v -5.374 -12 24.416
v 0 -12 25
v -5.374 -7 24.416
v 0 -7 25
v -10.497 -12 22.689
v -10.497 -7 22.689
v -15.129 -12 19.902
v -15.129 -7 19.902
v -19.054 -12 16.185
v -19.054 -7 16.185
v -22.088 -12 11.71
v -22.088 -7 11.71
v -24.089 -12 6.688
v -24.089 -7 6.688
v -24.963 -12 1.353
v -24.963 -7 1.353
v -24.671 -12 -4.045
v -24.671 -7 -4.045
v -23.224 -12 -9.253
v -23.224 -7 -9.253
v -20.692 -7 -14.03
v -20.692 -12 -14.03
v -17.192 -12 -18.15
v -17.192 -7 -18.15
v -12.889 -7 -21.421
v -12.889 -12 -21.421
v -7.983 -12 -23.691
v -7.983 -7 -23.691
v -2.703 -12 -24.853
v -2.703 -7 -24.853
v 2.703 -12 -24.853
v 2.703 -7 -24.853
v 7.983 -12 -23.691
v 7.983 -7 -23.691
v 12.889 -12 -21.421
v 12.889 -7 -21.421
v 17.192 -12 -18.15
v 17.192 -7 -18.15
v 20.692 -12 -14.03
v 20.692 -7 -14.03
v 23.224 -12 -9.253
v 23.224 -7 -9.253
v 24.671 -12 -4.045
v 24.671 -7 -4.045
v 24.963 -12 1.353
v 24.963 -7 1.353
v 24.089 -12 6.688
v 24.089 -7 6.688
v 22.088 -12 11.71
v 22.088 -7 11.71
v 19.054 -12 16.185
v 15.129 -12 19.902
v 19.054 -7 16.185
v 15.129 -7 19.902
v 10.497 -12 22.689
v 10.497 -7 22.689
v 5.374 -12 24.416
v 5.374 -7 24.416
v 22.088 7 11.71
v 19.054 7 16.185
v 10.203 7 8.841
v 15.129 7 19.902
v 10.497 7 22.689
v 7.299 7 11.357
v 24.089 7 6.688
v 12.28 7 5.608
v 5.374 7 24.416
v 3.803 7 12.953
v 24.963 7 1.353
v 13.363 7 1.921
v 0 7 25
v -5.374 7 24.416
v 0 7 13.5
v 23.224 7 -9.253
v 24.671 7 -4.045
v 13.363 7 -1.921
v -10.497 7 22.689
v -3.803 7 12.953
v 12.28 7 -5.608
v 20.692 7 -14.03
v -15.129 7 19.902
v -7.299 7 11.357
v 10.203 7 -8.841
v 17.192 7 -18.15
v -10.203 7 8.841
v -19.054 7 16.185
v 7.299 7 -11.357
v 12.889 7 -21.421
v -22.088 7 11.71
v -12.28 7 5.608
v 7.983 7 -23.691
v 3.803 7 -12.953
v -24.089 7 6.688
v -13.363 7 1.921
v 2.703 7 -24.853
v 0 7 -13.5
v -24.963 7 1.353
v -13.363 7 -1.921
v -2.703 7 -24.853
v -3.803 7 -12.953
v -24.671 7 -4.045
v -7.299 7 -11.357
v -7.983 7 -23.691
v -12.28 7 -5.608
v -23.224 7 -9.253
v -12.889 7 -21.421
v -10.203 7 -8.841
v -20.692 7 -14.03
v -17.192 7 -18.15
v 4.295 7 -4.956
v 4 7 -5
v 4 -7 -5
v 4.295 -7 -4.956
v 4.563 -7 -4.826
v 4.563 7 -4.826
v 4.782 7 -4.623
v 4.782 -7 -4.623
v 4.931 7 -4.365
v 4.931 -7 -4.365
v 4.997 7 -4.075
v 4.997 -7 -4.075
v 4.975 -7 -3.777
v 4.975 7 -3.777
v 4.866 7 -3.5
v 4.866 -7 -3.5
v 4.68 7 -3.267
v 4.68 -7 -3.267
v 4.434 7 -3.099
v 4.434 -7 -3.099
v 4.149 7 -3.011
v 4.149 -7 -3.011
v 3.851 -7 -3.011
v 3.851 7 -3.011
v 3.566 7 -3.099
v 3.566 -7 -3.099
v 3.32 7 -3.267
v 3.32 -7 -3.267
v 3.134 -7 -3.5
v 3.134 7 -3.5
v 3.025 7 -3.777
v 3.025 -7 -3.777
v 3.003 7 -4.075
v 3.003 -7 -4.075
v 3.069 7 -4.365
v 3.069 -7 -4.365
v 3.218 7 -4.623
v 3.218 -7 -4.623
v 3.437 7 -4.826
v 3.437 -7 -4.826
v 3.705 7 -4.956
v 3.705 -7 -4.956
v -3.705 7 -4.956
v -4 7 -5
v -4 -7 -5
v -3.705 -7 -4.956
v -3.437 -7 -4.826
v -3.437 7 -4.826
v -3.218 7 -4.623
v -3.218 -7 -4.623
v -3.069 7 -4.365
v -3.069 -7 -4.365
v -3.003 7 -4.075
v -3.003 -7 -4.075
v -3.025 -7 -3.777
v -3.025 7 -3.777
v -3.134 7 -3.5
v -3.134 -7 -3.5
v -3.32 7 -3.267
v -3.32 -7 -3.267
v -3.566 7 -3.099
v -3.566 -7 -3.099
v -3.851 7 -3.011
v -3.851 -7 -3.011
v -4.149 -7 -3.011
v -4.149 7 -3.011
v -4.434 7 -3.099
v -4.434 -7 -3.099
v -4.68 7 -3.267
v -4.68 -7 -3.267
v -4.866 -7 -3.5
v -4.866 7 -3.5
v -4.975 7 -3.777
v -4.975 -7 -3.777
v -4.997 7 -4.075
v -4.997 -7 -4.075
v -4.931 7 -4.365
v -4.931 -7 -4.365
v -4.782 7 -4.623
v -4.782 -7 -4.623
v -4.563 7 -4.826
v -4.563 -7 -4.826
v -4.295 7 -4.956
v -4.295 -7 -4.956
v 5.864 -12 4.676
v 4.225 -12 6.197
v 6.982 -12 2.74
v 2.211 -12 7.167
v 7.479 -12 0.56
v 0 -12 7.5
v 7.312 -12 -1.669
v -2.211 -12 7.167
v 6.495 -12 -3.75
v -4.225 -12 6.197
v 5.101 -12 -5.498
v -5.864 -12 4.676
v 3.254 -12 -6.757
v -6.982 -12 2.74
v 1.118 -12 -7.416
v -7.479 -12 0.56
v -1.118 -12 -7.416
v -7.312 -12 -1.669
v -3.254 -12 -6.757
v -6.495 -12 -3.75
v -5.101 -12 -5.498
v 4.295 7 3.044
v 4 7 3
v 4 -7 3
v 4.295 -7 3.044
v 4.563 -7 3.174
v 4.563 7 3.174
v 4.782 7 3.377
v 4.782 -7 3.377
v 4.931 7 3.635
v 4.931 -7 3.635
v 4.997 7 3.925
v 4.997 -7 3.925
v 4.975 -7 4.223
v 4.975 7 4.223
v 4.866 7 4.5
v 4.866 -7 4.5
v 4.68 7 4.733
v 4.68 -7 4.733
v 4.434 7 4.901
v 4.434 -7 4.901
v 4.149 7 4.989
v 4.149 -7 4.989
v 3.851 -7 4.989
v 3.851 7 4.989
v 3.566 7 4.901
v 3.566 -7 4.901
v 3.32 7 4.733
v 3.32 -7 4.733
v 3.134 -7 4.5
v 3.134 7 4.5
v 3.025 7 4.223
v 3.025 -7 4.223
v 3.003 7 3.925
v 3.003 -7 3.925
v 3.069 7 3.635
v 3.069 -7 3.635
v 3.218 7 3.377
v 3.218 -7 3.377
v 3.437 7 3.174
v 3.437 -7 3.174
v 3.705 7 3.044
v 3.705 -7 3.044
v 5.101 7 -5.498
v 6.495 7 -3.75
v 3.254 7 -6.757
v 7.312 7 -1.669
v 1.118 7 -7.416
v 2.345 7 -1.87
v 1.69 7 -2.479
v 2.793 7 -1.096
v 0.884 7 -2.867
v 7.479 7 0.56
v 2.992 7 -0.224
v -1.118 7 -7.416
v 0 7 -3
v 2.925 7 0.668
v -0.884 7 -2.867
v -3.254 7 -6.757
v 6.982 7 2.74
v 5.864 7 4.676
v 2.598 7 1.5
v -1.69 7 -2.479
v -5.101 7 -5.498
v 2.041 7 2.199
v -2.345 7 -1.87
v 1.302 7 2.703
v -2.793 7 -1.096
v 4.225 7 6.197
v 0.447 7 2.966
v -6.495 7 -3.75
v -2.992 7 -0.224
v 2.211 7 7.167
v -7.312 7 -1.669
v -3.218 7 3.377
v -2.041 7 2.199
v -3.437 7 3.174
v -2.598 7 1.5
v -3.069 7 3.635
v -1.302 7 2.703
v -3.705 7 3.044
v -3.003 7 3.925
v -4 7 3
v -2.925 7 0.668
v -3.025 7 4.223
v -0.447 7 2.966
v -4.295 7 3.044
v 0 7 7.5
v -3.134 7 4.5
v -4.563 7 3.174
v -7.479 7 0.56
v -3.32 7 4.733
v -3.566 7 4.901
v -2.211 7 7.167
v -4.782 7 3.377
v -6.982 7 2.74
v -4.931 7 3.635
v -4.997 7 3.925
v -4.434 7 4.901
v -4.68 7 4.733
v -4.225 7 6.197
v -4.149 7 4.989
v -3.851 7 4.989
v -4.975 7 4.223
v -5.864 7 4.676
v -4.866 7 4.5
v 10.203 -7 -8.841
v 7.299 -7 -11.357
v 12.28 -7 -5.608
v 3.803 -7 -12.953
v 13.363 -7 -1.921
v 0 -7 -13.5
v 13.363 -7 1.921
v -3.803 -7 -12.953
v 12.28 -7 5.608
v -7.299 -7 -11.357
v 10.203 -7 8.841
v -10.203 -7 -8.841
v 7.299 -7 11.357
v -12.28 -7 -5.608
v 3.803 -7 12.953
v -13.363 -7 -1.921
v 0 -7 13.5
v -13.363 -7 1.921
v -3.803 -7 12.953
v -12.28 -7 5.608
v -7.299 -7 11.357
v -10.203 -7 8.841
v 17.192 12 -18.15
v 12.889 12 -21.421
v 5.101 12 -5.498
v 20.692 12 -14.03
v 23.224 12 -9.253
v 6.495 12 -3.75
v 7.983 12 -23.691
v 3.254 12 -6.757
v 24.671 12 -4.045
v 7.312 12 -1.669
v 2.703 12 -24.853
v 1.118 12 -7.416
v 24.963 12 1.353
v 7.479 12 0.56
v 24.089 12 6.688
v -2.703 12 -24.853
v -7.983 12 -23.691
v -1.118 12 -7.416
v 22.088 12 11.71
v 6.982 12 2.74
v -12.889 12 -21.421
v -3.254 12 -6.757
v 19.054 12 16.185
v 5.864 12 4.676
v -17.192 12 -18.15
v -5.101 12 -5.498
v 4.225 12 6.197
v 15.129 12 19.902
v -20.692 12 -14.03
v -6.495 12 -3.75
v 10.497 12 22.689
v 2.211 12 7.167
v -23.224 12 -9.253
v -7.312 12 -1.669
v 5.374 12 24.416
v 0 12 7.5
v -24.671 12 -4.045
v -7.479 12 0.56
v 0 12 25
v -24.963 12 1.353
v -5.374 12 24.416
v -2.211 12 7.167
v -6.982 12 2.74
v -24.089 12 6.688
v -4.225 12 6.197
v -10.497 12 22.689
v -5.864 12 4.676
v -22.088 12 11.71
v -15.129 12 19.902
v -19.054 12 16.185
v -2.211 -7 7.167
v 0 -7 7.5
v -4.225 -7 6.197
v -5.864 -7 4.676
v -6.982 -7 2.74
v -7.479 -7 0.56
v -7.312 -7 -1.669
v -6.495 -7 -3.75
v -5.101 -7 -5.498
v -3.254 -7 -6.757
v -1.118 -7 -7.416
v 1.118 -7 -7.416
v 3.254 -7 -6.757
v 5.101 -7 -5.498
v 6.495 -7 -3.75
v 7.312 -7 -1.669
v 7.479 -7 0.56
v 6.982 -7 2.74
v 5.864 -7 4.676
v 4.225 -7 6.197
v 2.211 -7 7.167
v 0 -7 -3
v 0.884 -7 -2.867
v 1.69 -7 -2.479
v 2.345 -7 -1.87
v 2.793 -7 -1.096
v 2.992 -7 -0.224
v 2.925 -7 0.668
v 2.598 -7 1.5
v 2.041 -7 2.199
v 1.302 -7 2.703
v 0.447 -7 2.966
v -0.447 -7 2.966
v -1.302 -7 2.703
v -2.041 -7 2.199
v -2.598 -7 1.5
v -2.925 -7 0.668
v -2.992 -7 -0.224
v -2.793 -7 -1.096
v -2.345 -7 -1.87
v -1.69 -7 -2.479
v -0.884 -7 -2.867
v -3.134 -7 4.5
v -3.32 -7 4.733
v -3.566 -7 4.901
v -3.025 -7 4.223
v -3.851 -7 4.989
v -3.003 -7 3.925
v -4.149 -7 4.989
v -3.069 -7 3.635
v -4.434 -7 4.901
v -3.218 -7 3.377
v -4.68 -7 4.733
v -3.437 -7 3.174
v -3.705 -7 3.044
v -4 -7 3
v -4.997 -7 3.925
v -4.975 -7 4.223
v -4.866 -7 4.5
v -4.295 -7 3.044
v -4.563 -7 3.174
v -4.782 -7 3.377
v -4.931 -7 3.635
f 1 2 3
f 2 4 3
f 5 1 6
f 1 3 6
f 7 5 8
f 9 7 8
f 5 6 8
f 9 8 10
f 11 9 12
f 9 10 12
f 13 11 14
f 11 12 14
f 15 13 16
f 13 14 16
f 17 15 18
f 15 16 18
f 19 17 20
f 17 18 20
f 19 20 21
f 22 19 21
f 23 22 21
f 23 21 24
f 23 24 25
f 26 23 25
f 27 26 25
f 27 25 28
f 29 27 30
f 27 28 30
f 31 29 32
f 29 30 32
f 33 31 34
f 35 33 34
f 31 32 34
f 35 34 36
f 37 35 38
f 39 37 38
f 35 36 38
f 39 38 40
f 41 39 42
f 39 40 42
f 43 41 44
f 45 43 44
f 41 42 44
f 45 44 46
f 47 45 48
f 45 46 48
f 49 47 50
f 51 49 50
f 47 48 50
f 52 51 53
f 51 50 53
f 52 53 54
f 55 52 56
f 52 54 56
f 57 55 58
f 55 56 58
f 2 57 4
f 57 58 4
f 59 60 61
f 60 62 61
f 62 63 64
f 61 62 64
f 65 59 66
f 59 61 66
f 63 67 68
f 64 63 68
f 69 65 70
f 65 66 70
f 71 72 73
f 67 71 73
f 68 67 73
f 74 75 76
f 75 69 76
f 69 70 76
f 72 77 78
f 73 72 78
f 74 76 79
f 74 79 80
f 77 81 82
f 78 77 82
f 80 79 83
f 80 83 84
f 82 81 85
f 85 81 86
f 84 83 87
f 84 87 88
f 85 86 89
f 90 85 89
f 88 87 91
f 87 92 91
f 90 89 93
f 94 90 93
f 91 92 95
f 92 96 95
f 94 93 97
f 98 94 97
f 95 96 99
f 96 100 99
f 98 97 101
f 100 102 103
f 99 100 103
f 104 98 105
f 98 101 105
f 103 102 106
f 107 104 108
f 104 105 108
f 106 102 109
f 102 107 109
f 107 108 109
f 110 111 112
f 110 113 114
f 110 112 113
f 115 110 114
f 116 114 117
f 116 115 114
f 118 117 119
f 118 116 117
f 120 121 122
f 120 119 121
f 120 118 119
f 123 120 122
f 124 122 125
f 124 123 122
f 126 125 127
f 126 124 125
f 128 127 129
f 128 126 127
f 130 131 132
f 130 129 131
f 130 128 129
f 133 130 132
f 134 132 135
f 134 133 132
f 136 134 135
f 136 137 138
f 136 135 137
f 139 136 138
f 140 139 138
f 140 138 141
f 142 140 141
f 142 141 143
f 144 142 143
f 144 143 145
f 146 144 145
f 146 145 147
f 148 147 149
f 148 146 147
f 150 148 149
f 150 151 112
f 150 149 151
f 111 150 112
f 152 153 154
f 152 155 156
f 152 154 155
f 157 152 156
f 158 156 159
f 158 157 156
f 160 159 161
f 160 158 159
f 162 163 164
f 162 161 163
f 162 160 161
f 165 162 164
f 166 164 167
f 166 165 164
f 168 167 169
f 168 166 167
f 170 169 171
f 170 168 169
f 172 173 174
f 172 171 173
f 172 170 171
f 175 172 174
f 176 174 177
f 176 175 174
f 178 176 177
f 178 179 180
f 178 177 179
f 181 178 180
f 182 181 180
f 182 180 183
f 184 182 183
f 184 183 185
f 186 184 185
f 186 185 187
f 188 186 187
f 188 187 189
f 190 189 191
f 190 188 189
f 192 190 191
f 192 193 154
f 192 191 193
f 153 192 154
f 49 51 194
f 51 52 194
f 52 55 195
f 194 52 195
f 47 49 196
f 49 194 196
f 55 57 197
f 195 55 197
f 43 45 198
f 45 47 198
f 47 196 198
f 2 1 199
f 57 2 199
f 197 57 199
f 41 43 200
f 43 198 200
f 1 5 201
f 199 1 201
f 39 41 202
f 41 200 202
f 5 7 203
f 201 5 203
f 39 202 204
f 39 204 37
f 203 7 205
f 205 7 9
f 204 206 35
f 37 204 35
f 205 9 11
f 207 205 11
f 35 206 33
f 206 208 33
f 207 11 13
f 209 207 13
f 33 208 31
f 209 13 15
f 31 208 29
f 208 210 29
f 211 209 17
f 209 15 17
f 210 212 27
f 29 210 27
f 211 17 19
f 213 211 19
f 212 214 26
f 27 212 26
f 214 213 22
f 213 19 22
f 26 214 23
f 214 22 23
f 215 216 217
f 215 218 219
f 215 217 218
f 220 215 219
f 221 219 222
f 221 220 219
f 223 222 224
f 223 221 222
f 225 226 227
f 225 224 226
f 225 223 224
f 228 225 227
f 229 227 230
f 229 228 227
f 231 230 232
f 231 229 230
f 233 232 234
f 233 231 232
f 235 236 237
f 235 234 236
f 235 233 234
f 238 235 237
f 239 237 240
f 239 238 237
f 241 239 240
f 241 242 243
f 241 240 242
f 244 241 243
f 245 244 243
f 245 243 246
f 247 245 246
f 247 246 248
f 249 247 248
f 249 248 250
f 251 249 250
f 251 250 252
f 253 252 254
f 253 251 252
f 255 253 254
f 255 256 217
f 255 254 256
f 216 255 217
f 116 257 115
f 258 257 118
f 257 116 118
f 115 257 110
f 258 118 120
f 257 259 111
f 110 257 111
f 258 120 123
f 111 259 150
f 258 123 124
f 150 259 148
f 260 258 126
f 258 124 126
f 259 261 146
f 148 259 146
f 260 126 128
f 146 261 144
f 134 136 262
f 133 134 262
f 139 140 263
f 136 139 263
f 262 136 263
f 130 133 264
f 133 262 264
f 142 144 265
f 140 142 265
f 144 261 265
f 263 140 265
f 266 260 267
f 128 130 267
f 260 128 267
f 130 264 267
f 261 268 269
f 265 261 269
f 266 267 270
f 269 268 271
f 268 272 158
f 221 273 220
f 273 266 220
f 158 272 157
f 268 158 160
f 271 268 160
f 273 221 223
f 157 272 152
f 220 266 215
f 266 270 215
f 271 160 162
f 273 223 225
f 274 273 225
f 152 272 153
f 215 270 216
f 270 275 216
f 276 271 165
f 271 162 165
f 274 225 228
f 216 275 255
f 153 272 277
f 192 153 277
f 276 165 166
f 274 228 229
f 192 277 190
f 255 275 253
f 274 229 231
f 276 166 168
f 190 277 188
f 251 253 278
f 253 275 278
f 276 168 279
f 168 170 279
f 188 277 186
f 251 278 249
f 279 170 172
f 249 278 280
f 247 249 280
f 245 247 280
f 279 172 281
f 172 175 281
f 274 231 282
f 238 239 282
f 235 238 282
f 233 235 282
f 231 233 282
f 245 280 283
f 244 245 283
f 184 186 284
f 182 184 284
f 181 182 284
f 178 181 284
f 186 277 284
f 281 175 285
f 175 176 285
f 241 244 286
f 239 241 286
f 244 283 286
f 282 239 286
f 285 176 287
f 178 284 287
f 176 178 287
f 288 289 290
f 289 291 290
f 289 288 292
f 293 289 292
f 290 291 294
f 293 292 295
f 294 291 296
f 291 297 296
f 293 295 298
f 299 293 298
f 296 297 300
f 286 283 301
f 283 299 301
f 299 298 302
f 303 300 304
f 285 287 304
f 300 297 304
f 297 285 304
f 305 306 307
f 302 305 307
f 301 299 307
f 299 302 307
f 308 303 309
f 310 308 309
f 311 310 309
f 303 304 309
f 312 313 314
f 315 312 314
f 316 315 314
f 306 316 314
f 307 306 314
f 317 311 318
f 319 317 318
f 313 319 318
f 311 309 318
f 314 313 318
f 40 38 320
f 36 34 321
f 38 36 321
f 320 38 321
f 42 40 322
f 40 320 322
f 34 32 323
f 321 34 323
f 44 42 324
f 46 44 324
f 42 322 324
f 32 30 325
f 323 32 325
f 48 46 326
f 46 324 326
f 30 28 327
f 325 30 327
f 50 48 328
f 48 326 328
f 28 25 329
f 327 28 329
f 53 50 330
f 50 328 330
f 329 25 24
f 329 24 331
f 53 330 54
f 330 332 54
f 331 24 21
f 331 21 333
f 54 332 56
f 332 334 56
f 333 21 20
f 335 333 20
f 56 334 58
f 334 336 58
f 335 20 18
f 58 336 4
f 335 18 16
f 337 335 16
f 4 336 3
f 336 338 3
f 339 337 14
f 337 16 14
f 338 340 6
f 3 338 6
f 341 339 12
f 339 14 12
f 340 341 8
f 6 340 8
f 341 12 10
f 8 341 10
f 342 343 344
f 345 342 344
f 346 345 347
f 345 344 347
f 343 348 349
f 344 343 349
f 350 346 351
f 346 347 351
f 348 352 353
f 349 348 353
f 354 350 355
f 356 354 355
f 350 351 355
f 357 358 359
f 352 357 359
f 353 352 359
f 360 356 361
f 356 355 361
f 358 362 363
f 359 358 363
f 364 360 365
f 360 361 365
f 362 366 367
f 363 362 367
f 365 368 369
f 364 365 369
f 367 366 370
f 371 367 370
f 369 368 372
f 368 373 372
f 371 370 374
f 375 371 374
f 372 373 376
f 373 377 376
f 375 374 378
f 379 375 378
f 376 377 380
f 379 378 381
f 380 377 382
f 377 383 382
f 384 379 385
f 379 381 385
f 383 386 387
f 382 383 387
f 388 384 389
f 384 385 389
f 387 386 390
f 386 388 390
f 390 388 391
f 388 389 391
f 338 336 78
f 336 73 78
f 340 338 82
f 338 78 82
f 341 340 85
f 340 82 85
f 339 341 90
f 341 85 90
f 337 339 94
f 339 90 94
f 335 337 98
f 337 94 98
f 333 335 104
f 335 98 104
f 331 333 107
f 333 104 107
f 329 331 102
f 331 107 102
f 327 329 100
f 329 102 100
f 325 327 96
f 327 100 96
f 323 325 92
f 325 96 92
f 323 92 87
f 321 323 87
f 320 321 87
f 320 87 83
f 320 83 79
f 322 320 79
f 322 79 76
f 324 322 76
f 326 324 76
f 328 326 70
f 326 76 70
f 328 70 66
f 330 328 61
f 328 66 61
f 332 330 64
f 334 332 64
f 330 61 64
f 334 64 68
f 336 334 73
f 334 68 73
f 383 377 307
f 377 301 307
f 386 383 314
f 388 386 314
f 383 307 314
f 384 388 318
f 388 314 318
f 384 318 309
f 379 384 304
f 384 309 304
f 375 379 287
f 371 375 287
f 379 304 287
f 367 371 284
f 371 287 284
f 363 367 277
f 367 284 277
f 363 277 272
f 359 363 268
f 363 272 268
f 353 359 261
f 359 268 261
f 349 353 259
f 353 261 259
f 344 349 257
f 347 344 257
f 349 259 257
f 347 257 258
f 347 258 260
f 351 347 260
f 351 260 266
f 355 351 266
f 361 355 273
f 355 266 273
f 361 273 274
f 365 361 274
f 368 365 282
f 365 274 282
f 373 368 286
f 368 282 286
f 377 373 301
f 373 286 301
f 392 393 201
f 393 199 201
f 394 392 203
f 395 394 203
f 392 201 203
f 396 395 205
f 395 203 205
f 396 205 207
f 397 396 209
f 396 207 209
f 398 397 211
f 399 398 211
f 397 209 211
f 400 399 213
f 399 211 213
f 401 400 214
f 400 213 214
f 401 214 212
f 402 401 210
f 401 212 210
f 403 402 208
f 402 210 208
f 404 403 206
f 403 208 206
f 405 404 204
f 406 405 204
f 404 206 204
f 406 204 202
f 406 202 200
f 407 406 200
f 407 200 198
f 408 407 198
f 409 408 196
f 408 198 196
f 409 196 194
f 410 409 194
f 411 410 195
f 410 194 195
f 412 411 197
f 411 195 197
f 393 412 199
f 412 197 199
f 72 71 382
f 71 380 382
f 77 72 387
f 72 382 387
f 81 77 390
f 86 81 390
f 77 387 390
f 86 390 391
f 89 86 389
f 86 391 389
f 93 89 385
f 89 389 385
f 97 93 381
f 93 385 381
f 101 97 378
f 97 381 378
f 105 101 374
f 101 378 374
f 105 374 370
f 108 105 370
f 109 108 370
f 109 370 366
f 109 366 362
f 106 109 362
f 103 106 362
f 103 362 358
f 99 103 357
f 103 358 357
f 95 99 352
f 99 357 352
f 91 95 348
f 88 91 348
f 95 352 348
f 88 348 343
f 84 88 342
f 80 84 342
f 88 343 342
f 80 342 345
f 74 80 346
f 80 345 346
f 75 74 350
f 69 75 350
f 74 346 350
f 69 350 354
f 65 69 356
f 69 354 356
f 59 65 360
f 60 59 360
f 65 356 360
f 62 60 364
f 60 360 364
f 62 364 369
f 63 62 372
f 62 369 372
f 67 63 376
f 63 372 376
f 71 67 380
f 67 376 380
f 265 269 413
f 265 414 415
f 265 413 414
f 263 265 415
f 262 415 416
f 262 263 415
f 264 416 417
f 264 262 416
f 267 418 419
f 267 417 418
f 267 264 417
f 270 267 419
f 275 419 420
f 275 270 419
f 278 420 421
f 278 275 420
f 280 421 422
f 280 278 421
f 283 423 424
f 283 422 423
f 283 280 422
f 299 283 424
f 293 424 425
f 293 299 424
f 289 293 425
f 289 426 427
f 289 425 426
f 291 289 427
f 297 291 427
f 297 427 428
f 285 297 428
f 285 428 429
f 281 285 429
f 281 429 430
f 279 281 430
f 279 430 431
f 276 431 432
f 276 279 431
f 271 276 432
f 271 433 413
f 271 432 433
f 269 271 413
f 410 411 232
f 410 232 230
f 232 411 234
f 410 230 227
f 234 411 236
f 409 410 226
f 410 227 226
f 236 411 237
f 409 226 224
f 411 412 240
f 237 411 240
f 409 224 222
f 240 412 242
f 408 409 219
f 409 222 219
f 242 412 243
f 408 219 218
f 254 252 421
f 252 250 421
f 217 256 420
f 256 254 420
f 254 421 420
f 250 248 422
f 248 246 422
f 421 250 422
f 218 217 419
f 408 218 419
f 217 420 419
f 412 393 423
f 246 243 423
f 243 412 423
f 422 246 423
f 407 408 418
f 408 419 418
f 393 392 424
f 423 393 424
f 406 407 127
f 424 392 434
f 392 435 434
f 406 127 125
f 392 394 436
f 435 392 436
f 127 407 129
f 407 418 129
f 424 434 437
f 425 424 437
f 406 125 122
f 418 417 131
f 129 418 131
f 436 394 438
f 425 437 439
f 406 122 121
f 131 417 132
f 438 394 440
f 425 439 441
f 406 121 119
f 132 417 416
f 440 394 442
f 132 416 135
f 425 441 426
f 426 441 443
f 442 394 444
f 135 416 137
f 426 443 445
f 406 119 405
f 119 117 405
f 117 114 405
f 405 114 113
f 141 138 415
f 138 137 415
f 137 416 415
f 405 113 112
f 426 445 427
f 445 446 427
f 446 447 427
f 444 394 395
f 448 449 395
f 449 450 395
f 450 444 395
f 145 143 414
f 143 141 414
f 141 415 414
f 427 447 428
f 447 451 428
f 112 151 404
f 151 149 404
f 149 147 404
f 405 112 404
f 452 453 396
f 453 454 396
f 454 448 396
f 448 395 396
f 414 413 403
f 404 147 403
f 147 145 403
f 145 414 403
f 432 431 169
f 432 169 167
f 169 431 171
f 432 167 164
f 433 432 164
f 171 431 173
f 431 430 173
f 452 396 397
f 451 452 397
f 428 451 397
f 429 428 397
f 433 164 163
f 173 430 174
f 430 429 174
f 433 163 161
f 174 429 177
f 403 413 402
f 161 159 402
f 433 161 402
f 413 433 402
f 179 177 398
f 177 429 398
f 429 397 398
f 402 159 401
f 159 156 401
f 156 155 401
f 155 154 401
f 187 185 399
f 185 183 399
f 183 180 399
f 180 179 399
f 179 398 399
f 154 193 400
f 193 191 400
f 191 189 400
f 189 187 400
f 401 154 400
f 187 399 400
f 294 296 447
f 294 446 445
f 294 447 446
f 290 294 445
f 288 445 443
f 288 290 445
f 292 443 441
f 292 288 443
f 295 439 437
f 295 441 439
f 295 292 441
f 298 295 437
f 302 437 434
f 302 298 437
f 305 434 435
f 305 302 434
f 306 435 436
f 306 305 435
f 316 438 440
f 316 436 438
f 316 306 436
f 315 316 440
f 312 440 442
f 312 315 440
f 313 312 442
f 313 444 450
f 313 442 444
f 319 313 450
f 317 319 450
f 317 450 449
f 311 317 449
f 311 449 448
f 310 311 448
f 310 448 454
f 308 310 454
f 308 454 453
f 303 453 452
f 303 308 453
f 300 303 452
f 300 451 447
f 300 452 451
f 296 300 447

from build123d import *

# Parameters (mm, degrees)
CUT_EXTRUDE1_DEPTH      = 41.137264481
CUT_EXTRUDE1_DEPTH_BACK = 41.137264481
SKETCH2_R               = 3
SKETCH2_R_2             = 1


with BuildPart() as part:
    # Sketch1 → Revolve1 (revolve)
    with BuildSketch(Plane(origin=(0, 0, 0), x_dir=(0, 0, -1), z_dir=(1, 0, 0))):
        Polygon((0, 7), (0, -7), (-7.5, -7), (-7.5, -12), (-25, -12), (-25, -7), (-13.5, -7), (-13.5, 7), (-25, 7), (-25, 12), (-7.5, 12), (-7.5, 7), align=None)
    revolve(axis=Axis((0, 7, 0), (0, -1, 0)))

    # Sketch2 → Cut-Extrude1 (cut, two sides: drawn at the far end of the back side and taken through both)
    with BuildSketch(Plane.XZ.offset(7).offset(-CUT_EXTRUDE1_DEPTH_BACK)):
        with Locations(Location((0, 0, 0), (0, 0, 270))):
            Circle(SKETCH2_R)
        with Locations(Location((4, -4, 0), (0, 0, 270))):
            Circle(SKETCH2_R_2)
        with Locations(Location((-4, -4, 0), (0, 0, 270))):
            Circle(SKETCH2_R_2)
        with Locations(Location((-4, 4, 0), (0, 0, 270))):
            Circle(SKETCH2_R_2)
        with Locations(Location((4, 4, 0), (0, 0, 270))):
            Circle(SKETCH2_R_2)
    extrude(amount=CUT_EXTRUDE1_DEPTH + CUT_EXTRUDE1_DEPTH_BACK, mode=Mode.SUBTRACT)


solid = part.part
